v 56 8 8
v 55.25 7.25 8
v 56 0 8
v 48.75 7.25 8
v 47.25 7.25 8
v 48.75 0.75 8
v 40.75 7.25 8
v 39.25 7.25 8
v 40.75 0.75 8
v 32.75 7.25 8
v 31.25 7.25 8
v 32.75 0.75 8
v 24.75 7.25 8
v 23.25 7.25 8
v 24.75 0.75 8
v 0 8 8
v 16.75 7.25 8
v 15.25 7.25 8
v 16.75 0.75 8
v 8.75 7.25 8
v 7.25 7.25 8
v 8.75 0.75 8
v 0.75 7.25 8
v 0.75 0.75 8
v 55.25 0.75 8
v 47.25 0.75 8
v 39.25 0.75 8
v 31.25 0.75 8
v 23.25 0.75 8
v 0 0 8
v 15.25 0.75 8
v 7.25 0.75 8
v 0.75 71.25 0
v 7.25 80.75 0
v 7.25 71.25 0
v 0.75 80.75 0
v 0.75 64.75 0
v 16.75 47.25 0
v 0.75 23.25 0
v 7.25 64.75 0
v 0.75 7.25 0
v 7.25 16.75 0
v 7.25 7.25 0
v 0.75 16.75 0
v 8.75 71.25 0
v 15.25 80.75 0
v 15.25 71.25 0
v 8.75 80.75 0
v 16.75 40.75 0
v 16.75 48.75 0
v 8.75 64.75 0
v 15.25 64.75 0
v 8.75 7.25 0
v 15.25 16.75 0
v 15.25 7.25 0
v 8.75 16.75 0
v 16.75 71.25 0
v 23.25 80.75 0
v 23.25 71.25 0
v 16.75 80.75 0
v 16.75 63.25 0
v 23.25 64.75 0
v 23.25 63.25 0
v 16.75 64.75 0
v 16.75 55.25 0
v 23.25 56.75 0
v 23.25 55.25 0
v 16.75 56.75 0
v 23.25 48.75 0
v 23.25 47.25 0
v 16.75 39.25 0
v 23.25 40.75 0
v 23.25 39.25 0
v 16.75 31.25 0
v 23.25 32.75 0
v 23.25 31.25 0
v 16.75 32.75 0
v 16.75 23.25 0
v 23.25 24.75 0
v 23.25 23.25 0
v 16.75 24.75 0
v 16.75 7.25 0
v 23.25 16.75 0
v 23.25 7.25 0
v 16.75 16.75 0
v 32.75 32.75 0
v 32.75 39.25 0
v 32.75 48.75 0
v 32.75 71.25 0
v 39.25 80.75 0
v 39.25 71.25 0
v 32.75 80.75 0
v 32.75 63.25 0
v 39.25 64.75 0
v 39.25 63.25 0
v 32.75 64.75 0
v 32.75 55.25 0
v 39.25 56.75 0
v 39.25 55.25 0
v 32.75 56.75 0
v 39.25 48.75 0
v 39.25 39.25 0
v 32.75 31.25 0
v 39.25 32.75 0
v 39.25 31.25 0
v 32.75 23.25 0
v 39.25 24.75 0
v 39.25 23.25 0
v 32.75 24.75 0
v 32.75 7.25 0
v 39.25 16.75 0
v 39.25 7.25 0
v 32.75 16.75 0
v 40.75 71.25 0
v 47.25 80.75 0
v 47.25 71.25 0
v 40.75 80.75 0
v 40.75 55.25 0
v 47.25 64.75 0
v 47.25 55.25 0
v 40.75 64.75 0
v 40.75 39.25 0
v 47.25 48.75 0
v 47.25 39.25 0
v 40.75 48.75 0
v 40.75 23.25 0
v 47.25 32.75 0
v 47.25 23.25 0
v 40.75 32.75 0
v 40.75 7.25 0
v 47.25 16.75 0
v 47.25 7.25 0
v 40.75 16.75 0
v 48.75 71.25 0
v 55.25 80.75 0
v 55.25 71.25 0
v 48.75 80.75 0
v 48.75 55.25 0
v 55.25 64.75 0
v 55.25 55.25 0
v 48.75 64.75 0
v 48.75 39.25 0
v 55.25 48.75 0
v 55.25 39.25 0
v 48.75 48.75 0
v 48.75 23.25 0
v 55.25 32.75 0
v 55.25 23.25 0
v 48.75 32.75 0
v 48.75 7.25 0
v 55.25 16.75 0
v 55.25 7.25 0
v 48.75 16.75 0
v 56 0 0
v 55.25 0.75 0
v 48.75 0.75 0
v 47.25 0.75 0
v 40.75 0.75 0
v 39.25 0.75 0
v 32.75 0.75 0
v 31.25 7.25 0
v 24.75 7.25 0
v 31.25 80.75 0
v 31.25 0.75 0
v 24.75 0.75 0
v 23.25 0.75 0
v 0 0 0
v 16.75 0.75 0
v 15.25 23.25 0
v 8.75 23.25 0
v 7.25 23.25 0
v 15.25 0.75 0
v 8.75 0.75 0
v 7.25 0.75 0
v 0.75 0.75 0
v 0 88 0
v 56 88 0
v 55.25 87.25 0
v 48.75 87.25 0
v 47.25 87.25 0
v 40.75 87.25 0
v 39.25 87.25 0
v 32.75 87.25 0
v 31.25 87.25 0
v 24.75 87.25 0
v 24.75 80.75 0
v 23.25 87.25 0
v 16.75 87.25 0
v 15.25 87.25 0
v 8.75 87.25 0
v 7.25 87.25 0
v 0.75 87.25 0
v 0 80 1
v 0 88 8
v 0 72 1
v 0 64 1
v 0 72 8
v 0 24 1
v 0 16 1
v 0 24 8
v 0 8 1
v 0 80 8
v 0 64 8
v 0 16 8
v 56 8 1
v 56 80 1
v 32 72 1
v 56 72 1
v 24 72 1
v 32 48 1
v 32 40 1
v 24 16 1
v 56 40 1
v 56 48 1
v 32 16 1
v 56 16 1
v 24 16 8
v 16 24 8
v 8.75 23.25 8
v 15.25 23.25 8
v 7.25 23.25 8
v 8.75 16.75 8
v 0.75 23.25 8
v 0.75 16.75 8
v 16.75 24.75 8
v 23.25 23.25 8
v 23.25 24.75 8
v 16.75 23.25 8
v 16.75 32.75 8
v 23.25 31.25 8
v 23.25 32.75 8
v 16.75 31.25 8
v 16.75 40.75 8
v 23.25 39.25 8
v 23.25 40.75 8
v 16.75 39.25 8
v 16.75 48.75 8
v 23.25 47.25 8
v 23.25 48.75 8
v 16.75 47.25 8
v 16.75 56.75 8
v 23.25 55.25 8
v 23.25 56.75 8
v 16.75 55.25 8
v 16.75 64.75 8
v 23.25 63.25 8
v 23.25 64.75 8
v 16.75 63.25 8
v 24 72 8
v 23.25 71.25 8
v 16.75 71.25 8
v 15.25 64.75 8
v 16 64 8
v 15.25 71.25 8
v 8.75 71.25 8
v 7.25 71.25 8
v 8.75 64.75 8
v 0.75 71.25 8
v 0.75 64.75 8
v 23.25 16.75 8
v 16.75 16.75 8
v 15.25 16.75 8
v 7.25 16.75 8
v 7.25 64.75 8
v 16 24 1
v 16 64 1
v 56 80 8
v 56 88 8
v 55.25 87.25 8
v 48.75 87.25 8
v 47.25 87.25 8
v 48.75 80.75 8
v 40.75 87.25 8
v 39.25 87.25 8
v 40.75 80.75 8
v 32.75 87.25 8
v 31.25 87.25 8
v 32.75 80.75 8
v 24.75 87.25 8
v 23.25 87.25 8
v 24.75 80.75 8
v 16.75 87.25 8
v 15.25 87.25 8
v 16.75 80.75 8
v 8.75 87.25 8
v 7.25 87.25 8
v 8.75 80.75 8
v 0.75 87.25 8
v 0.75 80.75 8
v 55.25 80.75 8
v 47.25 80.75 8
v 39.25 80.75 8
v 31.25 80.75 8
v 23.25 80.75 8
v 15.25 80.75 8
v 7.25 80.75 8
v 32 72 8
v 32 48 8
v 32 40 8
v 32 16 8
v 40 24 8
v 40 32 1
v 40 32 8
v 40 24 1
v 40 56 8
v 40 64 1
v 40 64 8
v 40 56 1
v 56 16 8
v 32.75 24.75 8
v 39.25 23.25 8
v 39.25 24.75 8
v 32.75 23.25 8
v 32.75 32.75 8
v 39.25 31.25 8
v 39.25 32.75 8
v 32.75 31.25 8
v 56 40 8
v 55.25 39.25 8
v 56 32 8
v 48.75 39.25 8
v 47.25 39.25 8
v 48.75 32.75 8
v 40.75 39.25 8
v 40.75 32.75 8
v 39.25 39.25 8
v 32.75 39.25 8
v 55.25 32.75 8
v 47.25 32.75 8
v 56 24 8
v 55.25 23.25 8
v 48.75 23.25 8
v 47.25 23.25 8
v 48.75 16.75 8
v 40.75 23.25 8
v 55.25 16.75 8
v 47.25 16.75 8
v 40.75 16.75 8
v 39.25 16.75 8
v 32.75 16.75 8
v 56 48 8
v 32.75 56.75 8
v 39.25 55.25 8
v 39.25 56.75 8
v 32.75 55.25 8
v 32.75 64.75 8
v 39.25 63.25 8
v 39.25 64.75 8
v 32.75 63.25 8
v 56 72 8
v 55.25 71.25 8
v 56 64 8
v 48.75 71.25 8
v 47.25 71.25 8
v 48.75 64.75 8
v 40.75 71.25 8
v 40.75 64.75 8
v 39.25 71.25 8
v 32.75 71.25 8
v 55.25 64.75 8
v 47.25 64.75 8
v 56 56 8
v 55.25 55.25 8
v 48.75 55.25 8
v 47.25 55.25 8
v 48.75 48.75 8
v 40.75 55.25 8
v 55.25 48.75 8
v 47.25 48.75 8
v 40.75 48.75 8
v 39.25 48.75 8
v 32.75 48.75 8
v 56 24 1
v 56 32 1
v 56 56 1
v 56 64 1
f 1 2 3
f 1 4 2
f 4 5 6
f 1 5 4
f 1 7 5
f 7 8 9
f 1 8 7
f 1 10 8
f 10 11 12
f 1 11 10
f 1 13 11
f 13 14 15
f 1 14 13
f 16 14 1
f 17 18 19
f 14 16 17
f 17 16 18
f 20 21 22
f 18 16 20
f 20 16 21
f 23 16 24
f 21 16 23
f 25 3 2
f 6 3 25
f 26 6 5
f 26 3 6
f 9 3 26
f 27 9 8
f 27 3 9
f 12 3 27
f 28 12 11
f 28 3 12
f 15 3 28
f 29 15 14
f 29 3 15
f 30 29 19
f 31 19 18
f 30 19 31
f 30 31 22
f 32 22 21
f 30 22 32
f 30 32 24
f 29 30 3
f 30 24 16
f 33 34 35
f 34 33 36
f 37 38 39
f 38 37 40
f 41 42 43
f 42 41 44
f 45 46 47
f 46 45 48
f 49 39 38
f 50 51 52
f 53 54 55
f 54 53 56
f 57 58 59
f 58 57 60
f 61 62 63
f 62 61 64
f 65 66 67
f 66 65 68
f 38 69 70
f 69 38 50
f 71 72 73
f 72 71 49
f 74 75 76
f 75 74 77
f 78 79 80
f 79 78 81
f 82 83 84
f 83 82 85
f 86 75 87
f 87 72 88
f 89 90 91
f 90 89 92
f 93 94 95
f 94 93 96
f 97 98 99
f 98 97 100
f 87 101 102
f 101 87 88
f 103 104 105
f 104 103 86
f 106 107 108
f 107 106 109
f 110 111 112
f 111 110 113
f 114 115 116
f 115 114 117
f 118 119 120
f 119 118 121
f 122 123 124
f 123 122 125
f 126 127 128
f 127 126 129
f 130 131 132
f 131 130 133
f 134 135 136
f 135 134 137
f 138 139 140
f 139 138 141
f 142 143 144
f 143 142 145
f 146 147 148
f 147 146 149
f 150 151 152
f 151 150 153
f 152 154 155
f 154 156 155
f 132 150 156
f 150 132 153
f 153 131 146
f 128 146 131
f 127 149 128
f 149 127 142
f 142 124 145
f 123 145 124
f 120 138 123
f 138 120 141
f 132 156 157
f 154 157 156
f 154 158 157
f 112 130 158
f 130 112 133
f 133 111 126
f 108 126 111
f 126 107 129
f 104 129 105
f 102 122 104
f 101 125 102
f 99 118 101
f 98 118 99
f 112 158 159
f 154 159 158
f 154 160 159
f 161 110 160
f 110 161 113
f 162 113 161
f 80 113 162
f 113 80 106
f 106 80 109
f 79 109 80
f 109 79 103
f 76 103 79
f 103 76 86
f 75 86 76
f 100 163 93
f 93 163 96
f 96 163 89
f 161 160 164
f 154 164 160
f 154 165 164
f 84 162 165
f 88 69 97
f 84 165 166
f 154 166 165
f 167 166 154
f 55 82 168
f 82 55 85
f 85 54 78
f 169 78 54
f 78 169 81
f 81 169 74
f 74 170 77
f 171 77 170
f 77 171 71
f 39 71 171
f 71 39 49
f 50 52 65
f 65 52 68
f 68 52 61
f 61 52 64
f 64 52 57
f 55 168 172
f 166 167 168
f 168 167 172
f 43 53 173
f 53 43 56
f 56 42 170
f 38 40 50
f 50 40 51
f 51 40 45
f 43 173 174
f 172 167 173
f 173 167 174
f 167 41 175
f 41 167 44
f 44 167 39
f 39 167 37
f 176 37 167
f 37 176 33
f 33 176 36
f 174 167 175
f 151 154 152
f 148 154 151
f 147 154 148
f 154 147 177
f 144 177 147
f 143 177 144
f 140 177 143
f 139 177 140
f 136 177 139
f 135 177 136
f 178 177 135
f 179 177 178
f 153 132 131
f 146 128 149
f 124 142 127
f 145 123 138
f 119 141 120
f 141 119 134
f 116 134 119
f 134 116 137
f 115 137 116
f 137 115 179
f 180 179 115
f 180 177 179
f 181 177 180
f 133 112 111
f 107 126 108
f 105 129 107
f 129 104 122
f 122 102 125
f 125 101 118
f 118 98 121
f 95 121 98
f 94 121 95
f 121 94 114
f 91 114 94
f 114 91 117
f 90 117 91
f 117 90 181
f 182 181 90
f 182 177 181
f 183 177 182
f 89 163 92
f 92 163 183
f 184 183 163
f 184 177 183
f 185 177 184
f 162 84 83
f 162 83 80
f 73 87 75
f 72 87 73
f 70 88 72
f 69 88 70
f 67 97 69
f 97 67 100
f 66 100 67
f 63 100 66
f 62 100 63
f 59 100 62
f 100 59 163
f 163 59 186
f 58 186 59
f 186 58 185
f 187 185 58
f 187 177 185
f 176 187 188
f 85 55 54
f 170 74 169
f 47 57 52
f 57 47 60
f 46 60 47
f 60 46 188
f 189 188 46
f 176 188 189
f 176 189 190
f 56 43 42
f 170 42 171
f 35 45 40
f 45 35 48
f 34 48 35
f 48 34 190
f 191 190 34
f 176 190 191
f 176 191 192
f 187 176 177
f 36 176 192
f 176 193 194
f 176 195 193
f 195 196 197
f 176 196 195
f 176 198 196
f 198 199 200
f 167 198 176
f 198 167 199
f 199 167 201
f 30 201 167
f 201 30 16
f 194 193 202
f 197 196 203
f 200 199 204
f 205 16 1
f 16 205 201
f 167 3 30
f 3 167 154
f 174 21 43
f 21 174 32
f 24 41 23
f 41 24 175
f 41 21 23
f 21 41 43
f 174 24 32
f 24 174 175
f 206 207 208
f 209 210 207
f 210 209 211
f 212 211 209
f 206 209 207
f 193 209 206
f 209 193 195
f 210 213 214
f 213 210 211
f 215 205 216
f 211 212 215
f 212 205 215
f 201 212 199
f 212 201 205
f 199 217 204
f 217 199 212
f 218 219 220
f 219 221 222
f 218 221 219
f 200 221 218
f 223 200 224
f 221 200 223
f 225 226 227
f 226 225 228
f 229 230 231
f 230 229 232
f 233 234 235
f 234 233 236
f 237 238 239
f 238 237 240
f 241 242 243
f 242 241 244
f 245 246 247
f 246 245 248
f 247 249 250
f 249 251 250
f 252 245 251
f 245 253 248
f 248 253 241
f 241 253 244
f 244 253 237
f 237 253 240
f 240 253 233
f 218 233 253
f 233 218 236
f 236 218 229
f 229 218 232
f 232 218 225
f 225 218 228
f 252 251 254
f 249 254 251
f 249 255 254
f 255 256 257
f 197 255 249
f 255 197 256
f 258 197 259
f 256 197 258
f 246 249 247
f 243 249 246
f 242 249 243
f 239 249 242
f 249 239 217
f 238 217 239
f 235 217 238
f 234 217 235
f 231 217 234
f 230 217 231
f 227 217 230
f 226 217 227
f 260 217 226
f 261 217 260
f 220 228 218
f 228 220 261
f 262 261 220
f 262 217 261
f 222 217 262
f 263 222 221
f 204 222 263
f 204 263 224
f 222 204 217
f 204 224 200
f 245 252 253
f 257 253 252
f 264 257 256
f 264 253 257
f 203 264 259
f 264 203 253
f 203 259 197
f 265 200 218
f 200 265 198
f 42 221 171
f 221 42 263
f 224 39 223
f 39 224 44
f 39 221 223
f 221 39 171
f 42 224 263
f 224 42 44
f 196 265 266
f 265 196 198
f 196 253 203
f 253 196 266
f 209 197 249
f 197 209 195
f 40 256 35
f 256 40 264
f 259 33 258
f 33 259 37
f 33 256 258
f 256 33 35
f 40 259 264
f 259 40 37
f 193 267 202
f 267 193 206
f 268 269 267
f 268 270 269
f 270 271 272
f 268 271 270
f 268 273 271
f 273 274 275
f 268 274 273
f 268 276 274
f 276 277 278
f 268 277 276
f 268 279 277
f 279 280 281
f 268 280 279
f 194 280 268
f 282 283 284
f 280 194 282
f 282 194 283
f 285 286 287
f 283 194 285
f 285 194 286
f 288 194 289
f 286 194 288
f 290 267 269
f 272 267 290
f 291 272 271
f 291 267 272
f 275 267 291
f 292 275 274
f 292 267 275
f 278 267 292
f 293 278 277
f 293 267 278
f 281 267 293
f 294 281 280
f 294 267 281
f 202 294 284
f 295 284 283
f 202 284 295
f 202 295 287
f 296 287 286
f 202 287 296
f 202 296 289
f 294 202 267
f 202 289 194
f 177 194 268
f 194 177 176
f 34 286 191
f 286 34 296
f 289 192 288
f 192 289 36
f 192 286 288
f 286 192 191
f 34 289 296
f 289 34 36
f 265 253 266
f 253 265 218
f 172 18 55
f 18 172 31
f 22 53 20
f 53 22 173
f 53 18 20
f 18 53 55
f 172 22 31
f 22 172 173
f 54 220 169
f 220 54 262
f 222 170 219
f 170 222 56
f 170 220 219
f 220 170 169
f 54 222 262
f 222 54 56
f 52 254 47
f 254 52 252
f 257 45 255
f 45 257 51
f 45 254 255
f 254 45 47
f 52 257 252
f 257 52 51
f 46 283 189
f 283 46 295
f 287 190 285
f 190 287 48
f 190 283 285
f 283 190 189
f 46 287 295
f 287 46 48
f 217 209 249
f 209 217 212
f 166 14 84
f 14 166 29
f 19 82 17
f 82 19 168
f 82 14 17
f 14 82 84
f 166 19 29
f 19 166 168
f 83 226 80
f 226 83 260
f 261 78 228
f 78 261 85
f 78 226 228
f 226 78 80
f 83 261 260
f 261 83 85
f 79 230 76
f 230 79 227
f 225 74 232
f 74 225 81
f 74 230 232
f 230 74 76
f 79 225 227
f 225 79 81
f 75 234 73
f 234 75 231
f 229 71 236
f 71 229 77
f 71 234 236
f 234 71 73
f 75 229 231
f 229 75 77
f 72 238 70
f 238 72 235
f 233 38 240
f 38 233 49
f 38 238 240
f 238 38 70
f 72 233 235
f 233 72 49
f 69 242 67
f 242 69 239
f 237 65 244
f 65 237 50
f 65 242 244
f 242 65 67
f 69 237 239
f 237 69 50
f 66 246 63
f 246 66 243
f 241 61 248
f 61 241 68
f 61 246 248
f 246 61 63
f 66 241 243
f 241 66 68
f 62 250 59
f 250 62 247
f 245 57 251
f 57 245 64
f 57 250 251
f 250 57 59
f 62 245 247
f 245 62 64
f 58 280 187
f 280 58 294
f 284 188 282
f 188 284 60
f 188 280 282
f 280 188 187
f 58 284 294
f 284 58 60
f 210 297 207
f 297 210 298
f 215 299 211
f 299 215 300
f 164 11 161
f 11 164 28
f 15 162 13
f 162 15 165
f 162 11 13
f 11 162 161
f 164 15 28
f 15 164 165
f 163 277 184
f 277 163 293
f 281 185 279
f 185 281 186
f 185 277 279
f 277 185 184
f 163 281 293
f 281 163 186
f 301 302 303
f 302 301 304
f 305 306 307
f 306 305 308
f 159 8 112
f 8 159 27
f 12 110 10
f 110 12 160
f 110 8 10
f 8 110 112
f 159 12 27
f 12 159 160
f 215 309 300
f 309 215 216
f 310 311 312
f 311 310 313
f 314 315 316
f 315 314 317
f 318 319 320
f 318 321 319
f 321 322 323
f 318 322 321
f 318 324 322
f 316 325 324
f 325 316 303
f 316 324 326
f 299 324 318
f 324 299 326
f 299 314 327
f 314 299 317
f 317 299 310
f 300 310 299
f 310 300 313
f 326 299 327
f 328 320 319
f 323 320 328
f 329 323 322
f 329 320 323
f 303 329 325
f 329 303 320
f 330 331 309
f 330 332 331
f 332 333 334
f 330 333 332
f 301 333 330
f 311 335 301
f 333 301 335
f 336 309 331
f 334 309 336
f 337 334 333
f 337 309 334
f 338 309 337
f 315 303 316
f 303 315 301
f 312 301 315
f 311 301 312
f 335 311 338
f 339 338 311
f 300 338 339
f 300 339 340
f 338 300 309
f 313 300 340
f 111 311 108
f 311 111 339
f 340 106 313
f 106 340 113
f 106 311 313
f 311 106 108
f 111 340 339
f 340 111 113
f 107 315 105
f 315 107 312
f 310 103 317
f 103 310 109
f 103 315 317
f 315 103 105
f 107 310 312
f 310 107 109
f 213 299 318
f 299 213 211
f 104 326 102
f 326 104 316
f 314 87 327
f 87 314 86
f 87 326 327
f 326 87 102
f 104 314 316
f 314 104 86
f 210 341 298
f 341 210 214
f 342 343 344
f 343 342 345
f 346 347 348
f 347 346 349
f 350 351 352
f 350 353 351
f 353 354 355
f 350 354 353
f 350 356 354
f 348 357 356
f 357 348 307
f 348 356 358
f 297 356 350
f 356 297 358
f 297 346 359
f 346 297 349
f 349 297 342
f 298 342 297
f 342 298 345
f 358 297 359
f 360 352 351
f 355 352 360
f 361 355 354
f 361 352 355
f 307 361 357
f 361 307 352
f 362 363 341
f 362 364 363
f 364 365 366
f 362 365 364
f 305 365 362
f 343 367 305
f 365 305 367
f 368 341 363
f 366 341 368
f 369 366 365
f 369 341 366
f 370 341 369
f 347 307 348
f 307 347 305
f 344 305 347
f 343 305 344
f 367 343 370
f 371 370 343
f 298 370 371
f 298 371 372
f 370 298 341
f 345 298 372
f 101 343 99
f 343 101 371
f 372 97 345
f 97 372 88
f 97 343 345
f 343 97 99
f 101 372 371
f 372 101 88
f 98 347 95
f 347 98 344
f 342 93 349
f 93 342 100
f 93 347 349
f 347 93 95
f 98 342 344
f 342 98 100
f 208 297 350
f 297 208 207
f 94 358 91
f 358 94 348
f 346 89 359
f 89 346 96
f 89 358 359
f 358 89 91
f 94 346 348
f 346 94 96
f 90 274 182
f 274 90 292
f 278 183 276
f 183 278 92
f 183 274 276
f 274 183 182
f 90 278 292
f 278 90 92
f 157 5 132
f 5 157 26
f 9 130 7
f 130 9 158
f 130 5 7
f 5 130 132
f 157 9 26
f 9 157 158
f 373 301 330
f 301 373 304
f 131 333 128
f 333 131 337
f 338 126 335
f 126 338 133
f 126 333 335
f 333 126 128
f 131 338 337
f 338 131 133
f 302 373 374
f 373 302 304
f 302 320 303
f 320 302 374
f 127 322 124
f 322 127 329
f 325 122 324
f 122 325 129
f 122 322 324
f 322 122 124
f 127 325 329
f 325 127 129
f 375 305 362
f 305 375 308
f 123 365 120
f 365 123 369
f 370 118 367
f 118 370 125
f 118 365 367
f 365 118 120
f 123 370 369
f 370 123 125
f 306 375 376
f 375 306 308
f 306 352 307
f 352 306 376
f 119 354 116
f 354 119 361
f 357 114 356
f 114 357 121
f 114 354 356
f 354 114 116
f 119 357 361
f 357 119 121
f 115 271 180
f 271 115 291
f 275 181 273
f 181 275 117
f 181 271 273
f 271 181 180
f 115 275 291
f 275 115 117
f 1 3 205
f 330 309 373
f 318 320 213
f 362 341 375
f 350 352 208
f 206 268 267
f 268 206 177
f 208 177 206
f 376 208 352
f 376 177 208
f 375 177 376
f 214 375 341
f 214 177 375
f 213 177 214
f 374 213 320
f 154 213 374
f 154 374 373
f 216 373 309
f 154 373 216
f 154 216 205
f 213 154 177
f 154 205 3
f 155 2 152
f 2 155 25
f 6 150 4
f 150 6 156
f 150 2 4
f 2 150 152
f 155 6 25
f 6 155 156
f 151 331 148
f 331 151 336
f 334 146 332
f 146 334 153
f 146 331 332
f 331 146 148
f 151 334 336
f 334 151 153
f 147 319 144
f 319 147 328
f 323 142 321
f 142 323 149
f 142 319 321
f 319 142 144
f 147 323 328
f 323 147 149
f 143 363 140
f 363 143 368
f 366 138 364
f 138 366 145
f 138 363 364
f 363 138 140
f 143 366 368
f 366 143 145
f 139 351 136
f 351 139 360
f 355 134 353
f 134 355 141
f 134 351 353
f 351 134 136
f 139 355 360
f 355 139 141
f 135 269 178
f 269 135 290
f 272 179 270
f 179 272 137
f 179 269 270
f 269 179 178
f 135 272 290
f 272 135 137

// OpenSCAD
// matrix maze
// https://github.com/davidelliott/parametric-lab 
// License: CC-BY

// this design enables simple mazes to be easily made by defining
// the presence of walls or gaps in an array.

// size of blocks and gaps
cell_x=8; 
cell_y=8; 

// size of hole inside blocks
hole_x=6.5; 
hole_y=6.5;

// calculate hole position in each block
hole_x_pos=(cell_x-hole_x)/2; 
hole_y_pos=(cell_y-hole_y)/2;

z=8; // height of walls
f=1;  // height of floor
hole_height=-0.1; // increase for strength, decrease to save plastic/time

// define the maze as an array of z (walls) and f (floor)
// example from http://www.amentsoc.org/bug-club/fun/experiment-turning.html
m = [
[z,f,z,f,f,f,f,f,z,f,z],
[z,f,z,f,f,f,f,f,z,f,z],
[z,f,z,z,z,z,z,z,z,f,z],
[z,f,f,f,f,f,f,f,f,f,z],
[z,f,z,z,z,f,z,z,z,f,z],
[z,f,z,f,z,f,z,f,z,f,z],
[z,f,z,f,z,f,z,f,z,f,z]
];

// find the array dimensions
len_x=len(m)-1;
len_y=len(m[0])-1;

// loop through the array
for(x = [0 : len_x]) {
for(y = [0 : len_y]) {
	translate([x*cell_x,y*cell_y,0]){
		difference(){
		// build a cube for the current position
		// the height defined in the array is what
		// determines presence of a wall or gap
		cube([cell_x,cell_y,m[x][y]]);
		// now to save time and plastic
		// make the walls hollow by subtraction of a 
		// smaller cube.
		translate([hole_x_pos,hole_y_pos,hole_height]){
		if(m[x][y]==z) { 
			cube([hole_x,hole_y,m[x][y]+1]);
		}
		}
	}
	}
}
}
